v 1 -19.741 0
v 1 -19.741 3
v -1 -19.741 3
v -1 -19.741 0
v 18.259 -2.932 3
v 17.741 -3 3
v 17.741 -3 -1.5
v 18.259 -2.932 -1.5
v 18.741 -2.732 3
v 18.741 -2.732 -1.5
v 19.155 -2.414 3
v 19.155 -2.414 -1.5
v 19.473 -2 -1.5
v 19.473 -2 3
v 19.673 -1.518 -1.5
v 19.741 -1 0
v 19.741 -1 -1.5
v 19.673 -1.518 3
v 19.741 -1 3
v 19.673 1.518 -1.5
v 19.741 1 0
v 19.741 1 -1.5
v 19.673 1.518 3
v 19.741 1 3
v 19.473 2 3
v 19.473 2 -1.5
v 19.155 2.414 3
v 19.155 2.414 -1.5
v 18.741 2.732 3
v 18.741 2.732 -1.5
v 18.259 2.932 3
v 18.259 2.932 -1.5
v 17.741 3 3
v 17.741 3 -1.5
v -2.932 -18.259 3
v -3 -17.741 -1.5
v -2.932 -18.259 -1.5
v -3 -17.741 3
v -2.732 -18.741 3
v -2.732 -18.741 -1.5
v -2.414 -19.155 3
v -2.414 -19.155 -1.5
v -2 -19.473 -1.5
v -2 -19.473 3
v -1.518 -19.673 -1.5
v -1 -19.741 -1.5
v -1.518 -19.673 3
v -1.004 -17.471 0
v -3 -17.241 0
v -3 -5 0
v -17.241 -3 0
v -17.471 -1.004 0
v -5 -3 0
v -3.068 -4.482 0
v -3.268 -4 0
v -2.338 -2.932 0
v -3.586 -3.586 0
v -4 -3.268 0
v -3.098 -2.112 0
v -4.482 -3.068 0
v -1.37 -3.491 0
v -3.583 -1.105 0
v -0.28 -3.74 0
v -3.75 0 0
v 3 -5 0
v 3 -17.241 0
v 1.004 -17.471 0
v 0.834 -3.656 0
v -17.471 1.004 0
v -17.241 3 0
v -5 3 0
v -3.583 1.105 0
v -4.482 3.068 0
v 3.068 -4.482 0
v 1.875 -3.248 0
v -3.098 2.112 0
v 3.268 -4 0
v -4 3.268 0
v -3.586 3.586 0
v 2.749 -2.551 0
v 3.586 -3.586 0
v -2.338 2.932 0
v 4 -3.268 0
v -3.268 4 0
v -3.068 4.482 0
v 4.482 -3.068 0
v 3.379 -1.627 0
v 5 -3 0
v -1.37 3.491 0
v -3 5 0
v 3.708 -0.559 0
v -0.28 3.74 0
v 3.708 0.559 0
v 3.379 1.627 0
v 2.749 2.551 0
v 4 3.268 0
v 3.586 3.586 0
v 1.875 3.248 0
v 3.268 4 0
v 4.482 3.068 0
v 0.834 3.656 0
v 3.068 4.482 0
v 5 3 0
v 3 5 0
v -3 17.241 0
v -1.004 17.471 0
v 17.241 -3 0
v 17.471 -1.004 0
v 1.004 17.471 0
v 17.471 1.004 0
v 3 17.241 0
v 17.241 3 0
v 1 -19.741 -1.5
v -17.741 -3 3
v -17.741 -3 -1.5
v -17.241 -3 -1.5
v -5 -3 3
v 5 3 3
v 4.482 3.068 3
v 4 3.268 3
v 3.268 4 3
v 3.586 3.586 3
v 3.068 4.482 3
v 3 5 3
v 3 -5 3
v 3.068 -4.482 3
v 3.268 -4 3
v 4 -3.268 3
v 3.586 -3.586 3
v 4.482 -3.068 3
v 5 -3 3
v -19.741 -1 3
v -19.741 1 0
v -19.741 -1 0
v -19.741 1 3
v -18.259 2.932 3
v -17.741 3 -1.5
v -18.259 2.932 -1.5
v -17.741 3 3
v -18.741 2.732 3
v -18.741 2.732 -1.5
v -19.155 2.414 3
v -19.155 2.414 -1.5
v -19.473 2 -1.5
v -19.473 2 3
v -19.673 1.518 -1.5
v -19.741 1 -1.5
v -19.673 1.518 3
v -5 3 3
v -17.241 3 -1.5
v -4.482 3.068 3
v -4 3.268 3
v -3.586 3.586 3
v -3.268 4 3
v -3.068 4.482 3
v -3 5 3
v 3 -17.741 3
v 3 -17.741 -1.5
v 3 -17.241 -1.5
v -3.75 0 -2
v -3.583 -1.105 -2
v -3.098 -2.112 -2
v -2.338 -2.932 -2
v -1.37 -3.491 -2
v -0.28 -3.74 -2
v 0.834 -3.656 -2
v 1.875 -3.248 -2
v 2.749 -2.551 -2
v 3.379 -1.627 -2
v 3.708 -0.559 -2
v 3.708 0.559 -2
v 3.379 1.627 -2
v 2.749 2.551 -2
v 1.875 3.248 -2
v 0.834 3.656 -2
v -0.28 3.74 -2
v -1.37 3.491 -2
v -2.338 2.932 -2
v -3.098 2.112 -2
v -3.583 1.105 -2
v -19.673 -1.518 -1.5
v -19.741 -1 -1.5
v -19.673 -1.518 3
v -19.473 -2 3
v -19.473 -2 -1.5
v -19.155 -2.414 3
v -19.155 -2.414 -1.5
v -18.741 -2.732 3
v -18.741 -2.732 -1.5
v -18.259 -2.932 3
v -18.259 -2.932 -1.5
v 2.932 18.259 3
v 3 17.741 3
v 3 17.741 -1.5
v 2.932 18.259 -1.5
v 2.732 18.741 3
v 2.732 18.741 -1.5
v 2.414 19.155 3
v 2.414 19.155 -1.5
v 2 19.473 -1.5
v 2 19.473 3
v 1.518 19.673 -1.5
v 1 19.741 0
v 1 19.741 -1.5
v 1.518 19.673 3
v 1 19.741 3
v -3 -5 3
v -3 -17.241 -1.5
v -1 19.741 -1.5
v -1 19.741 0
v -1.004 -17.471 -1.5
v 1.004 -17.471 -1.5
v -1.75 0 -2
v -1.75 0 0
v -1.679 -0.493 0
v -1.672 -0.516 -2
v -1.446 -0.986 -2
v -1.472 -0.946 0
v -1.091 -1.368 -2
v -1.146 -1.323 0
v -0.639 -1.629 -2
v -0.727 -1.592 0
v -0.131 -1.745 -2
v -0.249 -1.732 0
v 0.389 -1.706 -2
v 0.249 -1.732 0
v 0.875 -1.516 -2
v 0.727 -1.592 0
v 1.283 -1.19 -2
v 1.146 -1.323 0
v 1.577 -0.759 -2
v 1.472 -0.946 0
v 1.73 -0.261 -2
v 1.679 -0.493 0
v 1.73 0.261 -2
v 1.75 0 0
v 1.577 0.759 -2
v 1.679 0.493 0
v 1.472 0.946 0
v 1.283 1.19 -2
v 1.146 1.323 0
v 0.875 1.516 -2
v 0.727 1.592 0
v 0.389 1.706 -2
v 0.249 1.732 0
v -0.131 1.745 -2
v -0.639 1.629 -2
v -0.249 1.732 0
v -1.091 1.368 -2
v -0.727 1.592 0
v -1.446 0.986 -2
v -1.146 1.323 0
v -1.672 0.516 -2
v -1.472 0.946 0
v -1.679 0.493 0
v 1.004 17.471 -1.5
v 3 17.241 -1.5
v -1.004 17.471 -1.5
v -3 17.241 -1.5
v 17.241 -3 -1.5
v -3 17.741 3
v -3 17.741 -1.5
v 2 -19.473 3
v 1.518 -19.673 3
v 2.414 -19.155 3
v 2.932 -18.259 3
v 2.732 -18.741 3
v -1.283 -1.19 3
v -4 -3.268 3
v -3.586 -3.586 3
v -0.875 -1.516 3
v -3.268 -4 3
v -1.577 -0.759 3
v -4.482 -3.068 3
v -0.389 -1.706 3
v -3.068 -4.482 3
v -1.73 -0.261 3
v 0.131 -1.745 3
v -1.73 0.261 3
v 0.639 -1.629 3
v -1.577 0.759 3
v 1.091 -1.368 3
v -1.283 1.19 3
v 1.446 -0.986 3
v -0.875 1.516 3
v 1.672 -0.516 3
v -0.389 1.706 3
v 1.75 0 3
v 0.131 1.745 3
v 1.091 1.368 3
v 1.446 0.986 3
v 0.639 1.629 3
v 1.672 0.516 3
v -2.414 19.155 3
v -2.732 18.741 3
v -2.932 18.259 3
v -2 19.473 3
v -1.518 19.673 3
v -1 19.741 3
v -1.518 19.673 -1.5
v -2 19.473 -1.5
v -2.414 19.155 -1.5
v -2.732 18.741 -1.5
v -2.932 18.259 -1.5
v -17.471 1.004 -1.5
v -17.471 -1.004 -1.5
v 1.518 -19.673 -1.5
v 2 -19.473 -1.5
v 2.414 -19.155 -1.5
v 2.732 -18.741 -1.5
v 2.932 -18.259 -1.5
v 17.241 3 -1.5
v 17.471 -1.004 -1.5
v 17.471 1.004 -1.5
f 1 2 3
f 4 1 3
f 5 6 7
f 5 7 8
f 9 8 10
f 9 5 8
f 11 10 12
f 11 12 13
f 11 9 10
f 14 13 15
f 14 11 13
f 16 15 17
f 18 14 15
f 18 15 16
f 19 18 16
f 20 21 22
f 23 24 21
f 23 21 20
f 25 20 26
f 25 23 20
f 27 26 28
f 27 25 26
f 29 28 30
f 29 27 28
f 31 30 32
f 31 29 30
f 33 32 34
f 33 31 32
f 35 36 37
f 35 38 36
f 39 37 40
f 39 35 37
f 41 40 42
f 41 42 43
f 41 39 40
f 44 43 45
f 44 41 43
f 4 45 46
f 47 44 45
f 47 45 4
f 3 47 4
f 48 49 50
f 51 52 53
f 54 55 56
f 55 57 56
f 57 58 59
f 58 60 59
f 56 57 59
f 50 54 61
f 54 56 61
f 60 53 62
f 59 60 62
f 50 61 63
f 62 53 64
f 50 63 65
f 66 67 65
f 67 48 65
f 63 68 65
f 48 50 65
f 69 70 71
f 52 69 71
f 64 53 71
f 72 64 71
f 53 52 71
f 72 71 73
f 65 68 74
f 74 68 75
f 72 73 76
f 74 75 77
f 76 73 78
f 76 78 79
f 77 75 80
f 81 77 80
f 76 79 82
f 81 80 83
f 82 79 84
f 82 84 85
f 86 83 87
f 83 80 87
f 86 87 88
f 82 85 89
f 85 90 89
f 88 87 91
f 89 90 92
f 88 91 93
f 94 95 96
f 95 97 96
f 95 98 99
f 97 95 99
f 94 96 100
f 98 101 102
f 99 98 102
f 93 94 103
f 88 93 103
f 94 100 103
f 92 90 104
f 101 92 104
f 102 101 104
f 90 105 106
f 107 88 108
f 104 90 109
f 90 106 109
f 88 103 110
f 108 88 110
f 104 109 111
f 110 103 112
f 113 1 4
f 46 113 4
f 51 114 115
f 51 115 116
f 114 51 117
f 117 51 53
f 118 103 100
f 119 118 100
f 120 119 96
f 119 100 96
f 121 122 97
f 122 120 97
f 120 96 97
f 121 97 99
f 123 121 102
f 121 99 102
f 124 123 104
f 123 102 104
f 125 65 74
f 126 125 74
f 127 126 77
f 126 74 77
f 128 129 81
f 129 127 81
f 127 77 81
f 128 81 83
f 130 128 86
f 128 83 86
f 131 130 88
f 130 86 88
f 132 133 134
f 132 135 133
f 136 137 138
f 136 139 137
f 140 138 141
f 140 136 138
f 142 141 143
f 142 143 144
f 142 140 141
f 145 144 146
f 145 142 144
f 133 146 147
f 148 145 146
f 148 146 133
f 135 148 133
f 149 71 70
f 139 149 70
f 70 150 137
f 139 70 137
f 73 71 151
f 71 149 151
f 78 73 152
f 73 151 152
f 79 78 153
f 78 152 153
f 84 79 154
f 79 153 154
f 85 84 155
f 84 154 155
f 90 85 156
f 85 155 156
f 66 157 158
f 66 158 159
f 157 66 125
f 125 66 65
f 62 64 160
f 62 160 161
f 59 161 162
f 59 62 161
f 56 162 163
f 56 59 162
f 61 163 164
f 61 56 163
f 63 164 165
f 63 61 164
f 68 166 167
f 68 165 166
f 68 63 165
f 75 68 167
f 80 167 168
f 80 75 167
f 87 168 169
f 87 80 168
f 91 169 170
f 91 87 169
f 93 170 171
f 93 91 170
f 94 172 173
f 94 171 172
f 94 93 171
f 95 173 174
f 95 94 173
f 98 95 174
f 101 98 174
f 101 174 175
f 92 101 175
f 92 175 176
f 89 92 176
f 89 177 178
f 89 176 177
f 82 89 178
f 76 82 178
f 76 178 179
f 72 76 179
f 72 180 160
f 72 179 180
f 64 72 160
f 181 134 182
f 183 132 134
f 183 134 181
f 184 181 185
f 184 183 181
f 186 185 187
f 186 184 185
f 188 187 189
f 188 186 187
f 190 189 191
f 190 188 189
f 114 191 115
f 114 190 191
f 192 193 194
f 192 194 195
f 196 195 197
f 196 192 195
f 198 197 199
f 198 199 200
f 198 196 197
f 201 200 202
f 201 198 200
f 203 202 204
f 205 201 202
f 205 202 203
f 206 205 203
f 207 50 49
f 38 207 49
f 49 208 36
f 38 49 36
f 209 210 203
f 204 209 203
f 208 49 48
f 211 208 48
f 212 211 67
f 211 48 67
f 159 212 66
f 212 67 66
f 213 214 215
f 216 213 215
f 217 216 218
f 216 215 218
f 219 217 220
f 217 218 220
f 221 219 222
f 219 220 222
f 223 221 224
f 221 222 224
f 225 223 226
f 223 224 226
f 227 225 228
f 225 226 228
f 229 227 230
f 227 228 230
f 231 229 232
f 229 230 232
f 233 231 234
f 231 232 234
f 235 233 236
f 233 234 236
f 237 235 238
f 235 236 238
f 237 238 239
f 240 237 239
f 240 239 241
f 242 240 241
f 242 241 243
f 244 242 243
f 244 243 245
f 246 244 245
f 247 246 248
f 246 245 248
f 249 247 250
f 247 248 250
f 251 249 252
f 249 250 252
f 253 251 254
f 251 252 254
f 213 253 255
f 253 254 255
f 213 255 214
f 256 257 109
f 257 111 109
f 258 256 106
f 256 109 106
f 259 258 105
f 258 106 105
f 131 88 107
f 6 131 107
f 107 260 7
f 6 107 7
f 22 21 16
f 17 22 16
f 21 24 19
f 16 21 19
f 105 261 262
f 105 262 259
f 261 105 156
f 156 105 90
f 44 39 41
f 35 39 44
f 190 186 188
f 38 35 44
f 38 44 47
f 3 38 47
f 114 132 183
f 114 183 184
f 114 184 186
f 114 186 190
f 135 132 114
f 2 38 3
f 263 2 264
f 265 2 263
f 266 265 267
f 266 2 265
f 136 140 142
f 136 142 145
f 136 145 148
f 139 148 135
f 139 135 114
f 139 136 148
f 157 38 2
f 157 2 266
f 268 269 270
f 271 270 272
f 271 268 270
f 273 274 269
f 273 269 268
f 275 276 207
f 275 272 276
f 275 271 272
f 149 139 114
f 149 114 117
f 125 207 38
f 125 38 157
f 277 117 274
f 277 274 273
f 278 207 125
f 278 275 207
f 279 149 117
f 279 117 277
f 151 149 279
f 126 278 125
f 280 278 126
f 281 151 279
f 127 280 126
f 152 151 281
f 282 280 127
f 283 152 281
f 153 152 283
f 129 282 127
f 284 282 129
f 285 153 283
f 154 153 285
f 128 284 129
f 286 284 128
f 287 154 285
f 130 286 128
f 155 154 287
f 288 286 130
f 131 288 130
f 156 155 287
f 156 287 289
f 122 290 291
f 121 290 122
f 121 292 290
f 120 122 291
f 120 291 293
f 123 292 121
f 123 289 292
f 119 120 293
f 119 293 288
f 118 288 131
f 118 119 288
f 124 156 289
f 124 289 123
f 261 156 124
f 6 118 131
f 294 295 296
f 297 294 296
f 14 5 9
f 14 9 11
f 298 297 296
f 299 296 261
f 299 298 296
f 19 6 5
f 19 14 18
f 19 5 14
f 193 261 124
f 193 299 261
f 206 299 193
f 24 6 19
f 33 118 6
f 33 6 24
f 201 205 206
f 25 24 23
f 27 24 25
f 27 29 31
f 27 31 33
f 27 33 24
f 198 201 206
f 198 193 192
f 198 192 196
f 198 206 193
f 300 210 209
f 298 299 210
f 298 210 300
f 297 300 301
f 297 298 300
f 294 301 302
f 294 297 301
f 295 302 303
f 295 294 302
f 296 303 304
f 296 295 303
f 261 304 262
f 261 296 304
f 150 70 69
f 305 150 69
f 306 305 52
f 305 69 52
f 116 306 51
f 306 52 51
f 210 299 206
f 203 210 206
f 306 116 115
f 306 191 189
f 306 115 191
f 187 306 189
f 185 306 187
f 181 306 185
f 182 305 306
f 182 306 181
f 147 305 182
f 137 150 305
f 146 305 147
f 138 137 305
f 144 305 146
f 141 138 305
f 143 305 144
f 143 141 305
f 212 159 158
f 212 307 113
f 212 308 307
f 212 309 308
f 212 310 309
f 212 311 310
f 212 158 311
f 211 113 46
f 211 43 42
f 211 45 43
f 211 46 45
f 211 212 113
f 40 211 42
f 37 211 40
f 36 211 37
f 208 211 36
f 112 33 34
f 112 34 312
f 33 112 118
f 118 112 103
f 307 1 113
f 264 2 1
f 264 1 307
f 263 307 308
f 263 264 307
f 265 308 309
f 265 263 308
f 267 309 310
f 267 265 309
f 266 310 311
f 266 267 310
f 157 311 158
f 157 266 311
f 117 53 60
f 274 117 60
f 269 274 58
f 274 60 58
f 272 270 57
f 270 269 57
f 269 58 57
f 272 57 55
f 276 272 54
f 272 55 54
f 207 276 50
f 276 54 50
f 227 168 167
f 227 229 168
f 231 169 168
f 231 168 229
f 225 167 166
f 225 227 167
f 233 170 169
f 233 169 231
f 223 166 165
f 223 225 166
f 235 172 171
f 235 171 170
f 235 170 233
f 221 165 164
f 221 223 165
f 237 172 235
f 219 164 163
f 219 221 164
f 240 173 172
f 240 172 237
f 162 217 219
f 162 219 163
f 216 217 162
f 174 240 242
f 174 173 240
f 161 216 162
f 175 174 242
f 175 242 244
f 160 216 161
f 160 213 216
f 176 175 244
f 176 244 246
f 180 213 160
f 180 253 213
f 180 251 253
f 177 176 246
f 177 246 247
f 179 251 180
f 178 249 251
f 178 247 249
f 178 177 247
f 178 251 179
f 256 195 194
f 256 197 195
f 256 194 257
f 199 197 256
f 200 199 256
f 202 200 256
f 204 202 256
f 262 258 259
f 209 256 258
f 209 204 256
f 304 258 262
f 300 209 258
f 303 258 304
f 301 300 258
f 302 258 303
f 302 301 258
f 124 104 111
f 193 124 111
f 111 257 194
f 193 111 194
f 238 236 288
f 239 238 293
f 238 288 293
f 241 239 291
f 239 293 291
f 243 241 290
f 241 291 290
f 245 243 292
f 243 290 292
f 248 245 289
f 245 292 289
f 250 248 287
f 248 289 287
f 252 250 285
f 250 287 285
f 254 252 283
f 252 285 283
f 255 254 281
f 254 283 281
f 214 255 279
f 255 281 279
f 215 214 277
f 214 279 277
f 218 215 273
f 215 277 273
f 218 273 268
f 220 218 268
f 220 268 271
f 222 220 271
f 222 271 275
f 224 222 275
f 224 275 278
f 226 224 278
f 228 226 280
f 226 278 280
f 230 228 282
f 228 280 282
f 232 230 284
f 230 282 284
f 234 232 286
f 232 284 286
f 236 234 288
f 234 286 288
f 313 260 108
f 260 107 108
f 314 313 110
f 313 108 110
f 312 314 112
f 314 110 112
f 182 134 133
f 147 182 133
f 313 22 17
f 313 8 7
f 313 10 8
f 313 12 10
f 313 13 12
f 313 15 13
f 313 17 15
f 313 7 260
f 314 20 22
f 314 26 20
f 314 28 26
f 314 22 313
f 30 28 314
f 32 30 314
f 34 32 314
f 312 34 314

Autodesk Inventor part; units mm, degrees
ref_plane "YZ Plane" through (0, 0, 0) normal (1, 0, 0) x (0, 1, 0)
ref_plane "XZ Plane" through (0, 0, 0) normal (0, 1, 0) x (-1, 0, 0)
sketch "Szkic1" plane through (0, 0, 0) normal (0, 0, 1) x (1, 0, 0)
  circle A0 centre (0, 0) radius 17.5
  circle A1 centre (0, 0) radius 15
  line L0 (-3, -17.2409) -> (3, -17.2409)
  line L1 (3, -17.2409) -> (3, 17.2409)
  line L2 (3, 17.2409) -> (-3, 17.2409)
  line L3 (-3, 17.2409) -> (-3, -17.2409)
  line L4 (-3, -17.2409) -> (3, 17.2409) construction
  line L5 (3, -17.2409) -> (-3, 17.2409) construction
  line L6 (17.2409, 3) -> (-17.2409, 3)
  line L7 (-17.2409, 3) -> (-17.2409, -3)
  line L8 (-17.2409, -3) -> (17.2409, -3)
  line L9 (17.2409, -3) -> (17.2409, 3)
  line L10 (17.2409, 3) -> (-17.2409, -3) construction
  line L11 (-17.2409, 3) -> (17.2409, -3) construction
  circle A2 centre (0, 0) radius 1.75
  point P0 (-3, 3)
  point P1 (-3, -3)
  point P2 (3, -3)
  point P3 (3, 3)
  dimension "d0" = 6
  dimension "d1" = 6
  dimension "d2" = 3.5
extrude "Wyciągnięcie proste1" add sketch "Szkic1" along normal blind 3 contours L9 L8 A1 L6 | L1 A1 L3 L2 | A1 L8 L1 L6 | L0 L3 A1 L1 | L1 L6 L3 A1 | L1 L8 L3 L6 | A1 L3 L8 L1 | L6 A1 L8 L7 | L3 L8 A1 L6 | A2
sketch "Szkic2" plane through (0, 0, 3) normal (0, 0, 1) x (1, 0, 0)
  circle A0 centre (0, 0) radius 1.75
  dimension "d5" = 3.5
extrude "Wyciągnięcie proste2" cut sketch "Szkic2" against normal through all
sketch "Szkic3" plane through (0, 0, 0) normal (0, 0, -1) x (-1, 0, 0)
  circle A0 centre (0, 0) radius 1.75
  circle A1 centre (0, 0) radius 3.75
  dimension "d8" = 2
ref_plane "Płaszczyzna konstrukcyjna1" through (-11.5, -11.5, -2) normal (0, 0, -1) x (0, 1, 0)
extrude "Wyciągnięcie proste3" add sketch "Szkic3" along normal up to surface (2 mm away)
sketch "Szkic4" plane through (0, 0, 3) normal (0, 0, 1) x (1, 0, 0)
  circle A0 centre (0, 0) radius 17.5
  circle A1 centre (0, 0) radius 1.75
  line L0 (-17.2409, 3) -> (-17.2409, -3)
  line L1 (-17.2409, -3) -> (-3, -3)
  line L2 (-3, -3) -> (-3, -17.2409)
  line L3 (-3, -17.2409) -> (3, -17.2409)
  line L4 (3, -17.2409) -> (3, -3)
  line L5 (3, -3) -> (17.2409, -3)
  line L6 (17.2409, -3) -> (17.2409, 3)
  line L7 (17.2409, 3) -> (3, 3)
  line L8 (3, 3) -> (3, 17.2409)
  line L9 (3, 17.2409) -> (-3, 17.2409)
  line L10 (-3, 17.2409) -> (-3, 3)
  line L11 (-3, 3) -> (-17.2409, 3)
  line L12 (17.2409, 3) -> (3, 3)
  line L13 (17.2409, 3) -> (19.7409, 3)
  line L14 (19.7409, 3) -> (19.7409, -3)
  line L15 (19.7409, -3) -> (17.2409, -3)
  line L16 (17.2409, -3) -> (17.2409, 3)
  line L17 (-3, 3) -> (-17.2409, 3)
  line L18 (-17.2409, 3) -> (-19.7409, 3)
  line L19 (-19.7409, 3) -> (-19.7409, -3)
  line L20 (-19.7409, -3) -> (-17.2409, -3)
  line L21 (-17.2409, -3) -> (-17.2409, 3)
  line L22 (-3, -17.2409) -> (3, -17.2409)
  line L23 (3, -17.2409) -> (3, -19.7409)
  line L24 (3, -19.7409) -> (-3, -19.7409)
  line L25 (-3, -19.7409) -> (-3, -17.2409)
  line L26 (3, 17.2409) -> (-3, 17.2409)
  line L27 (-3, 17.2409) -> (-3, 19.7409)
  line L28 (-3, 19.7409) -> (3, 19.7409)
  line L29 (3, 19.7409) -> (3, 17.2409)
  dimension "d11" = 2.5
  dimension "d12" = 2.5
  dimension "d13" = 2.5
  dimension "d14" = 2.5
extrude "Wyciągnięcie proste4" add sketch "Szkic4" against normal blind 3 contours A0 L6 | A0 L13 L14 L15 | L9 A0 | A0 L27 L28 L29 | L23 L24 L25 A0 | A0 L3 | L0 A0 | A0 L20 L19 L18
sketch "Szkic5" plane through (0, 0, 0) normal (0, 0, -1) x (-1, 0, 0)
  circle A0 centre (0, 0) radius 17.5
  circle A1 centre (0, 0) radius 3.75
  line L0 (3, 3) -> (19.7409, 3)
  line L1 (3, 3) -> (3, 19.7409)
  line L2 (3, 19.7409) -> (-3, 19.7409)
  line L3 (-3, 3) -> (-3, 19.7409)
  line L4 (-3, 3) -> (-19.7409, 3)
  line L5 (-19.7409, 3) -> (-19.7409, -3)
  line L6 (-3, -3) -> (-19.7409, -3)
  line L7 (-3, -3) -> (-3, -19.7409)
  line L8 (-3, -19.7409) -> (3, -19.7409)
  line L9 (3, -3) -> (3, -19.7409)
  line L10 (3, -3) -> (19.7409, -3)
  line L11 (19.7409, -3) -> (19.7409, 3)
  circle A2 centre (0, 0) radius 17.7
  point P0 (3, -17.4439)
  point P1 (-3, -17.4439)
  point P2 (17.4439, 3)
  point P3 (17.4439, -3)
  point P4 (-17.4439, -3)
  point P5 (-17.4439, 3)
  point P6 (-3, 17.4439)
  point P7 (3, 17.4439)
  dimension "d17" = 0.2
extrude "Wyciągnięcie proste5" add sketch "Szkic5" along normal blind 1.5 contours L0 L11 L10 A2 | A2 L3 L2 L1 | L9 L8 L7 A2 | A2 L6 L5 L4
fillet "Zaokrąglenie1" radius 2 19 edges at (-3, -3, 1.5) (-3, -19.7409, 1.5) (-3, -19.7409, -0.75) (-19.7409, -3, -0.75) (-19.7409, -3, 1.5) (3, -19.7409, -0.75) (3, -19.7409, 1.5) (3, -3, 1.5) (19.7409, -3, 1.5) (19.7409, -3, -0.75) (19.7409, 3, -0.75) (19.7409, 3, 1.5) (3, 3, 1.5) (3, 19.7409, 1.5) (3, 19.7409, -0.75) (-3, 19.7409, -0.75) (-3, 19.7409, 1.5) (-19.7409, 3, 1.5) (-19.7409, 3, -0.75)
fillet "Zaokrąglenie2" radius 2 1 edges at (-3, 3, 1.5)
sketch "Szkic6" plane through (0, 0, 0) normal (0, 0, -1) x (-1, 0, 0)
  circle A0 centre (0, 0) radius 17.5
  arc A1 (17.4439, -3) -> (17.4439, 3) centre (0, 0) ccw
  line L0 (5, 3) -> (17.4439, 3)
  arc A2 (3, 5) -> (5, 3) centre (5, 5) ccw
  line L1 (3, 5) -> (3, 17.4439)
  arc A3 (3, 17.4439) -> (-3, 17.4439) centre (0, 0) ccw
  line L2 (-3, 5) -> (-3, 17.4439)
  arc A4 (-5, 3) -> (-3, 5) centre (-5, 5) ccw
  line L3 (-5, 3) -> (-17.4439, 3)
  arc A5 (-17.4439, 3) -> (-17.4439, -3) centre (0, 0) ccw
  line L4 (-5, -3) -> (-17.4439, -3)
  arc A6 (-3, -5) -> (-5, -3) centre (-5, -5) ccw
  line L5 (-3, -5) -> (-3, -17.4439)
  arc A7 (-3, -17.4439) -> (3, -17.4439) centre (0, 0) ccw
  line L6 (3, -5) -> (3, -17.4439)
  arc A8 (5, -3) -> (3, -5) centre (5, -5) ccw
  line L7 (5, -3) -> (17.4439, -3)
  circle A9 centre (0, 0) radius 3.75
  point P0 (3, -17.2409)
  point P1 (-3, -17.2409)
  point P2 (-17.2409, -3)
  point P3 (-17.2409, 3)
  point P4 (-3, 17.2409)
  point P5 (3, 17.2409)
  point P6 (17.2409, 3)
  point P7 (17.2409, -3)
  dimension "d22" = 35
extrude "Wyciągnięcie proste6" add sketch "Szkic6" along normal up to surface (1.5 mm away) contours A0 L0 A1 L7 | A0 L2 A3 L1 | L6 A7 L5 A0 | A0 L4 A5 L3
properties part number "gora"
